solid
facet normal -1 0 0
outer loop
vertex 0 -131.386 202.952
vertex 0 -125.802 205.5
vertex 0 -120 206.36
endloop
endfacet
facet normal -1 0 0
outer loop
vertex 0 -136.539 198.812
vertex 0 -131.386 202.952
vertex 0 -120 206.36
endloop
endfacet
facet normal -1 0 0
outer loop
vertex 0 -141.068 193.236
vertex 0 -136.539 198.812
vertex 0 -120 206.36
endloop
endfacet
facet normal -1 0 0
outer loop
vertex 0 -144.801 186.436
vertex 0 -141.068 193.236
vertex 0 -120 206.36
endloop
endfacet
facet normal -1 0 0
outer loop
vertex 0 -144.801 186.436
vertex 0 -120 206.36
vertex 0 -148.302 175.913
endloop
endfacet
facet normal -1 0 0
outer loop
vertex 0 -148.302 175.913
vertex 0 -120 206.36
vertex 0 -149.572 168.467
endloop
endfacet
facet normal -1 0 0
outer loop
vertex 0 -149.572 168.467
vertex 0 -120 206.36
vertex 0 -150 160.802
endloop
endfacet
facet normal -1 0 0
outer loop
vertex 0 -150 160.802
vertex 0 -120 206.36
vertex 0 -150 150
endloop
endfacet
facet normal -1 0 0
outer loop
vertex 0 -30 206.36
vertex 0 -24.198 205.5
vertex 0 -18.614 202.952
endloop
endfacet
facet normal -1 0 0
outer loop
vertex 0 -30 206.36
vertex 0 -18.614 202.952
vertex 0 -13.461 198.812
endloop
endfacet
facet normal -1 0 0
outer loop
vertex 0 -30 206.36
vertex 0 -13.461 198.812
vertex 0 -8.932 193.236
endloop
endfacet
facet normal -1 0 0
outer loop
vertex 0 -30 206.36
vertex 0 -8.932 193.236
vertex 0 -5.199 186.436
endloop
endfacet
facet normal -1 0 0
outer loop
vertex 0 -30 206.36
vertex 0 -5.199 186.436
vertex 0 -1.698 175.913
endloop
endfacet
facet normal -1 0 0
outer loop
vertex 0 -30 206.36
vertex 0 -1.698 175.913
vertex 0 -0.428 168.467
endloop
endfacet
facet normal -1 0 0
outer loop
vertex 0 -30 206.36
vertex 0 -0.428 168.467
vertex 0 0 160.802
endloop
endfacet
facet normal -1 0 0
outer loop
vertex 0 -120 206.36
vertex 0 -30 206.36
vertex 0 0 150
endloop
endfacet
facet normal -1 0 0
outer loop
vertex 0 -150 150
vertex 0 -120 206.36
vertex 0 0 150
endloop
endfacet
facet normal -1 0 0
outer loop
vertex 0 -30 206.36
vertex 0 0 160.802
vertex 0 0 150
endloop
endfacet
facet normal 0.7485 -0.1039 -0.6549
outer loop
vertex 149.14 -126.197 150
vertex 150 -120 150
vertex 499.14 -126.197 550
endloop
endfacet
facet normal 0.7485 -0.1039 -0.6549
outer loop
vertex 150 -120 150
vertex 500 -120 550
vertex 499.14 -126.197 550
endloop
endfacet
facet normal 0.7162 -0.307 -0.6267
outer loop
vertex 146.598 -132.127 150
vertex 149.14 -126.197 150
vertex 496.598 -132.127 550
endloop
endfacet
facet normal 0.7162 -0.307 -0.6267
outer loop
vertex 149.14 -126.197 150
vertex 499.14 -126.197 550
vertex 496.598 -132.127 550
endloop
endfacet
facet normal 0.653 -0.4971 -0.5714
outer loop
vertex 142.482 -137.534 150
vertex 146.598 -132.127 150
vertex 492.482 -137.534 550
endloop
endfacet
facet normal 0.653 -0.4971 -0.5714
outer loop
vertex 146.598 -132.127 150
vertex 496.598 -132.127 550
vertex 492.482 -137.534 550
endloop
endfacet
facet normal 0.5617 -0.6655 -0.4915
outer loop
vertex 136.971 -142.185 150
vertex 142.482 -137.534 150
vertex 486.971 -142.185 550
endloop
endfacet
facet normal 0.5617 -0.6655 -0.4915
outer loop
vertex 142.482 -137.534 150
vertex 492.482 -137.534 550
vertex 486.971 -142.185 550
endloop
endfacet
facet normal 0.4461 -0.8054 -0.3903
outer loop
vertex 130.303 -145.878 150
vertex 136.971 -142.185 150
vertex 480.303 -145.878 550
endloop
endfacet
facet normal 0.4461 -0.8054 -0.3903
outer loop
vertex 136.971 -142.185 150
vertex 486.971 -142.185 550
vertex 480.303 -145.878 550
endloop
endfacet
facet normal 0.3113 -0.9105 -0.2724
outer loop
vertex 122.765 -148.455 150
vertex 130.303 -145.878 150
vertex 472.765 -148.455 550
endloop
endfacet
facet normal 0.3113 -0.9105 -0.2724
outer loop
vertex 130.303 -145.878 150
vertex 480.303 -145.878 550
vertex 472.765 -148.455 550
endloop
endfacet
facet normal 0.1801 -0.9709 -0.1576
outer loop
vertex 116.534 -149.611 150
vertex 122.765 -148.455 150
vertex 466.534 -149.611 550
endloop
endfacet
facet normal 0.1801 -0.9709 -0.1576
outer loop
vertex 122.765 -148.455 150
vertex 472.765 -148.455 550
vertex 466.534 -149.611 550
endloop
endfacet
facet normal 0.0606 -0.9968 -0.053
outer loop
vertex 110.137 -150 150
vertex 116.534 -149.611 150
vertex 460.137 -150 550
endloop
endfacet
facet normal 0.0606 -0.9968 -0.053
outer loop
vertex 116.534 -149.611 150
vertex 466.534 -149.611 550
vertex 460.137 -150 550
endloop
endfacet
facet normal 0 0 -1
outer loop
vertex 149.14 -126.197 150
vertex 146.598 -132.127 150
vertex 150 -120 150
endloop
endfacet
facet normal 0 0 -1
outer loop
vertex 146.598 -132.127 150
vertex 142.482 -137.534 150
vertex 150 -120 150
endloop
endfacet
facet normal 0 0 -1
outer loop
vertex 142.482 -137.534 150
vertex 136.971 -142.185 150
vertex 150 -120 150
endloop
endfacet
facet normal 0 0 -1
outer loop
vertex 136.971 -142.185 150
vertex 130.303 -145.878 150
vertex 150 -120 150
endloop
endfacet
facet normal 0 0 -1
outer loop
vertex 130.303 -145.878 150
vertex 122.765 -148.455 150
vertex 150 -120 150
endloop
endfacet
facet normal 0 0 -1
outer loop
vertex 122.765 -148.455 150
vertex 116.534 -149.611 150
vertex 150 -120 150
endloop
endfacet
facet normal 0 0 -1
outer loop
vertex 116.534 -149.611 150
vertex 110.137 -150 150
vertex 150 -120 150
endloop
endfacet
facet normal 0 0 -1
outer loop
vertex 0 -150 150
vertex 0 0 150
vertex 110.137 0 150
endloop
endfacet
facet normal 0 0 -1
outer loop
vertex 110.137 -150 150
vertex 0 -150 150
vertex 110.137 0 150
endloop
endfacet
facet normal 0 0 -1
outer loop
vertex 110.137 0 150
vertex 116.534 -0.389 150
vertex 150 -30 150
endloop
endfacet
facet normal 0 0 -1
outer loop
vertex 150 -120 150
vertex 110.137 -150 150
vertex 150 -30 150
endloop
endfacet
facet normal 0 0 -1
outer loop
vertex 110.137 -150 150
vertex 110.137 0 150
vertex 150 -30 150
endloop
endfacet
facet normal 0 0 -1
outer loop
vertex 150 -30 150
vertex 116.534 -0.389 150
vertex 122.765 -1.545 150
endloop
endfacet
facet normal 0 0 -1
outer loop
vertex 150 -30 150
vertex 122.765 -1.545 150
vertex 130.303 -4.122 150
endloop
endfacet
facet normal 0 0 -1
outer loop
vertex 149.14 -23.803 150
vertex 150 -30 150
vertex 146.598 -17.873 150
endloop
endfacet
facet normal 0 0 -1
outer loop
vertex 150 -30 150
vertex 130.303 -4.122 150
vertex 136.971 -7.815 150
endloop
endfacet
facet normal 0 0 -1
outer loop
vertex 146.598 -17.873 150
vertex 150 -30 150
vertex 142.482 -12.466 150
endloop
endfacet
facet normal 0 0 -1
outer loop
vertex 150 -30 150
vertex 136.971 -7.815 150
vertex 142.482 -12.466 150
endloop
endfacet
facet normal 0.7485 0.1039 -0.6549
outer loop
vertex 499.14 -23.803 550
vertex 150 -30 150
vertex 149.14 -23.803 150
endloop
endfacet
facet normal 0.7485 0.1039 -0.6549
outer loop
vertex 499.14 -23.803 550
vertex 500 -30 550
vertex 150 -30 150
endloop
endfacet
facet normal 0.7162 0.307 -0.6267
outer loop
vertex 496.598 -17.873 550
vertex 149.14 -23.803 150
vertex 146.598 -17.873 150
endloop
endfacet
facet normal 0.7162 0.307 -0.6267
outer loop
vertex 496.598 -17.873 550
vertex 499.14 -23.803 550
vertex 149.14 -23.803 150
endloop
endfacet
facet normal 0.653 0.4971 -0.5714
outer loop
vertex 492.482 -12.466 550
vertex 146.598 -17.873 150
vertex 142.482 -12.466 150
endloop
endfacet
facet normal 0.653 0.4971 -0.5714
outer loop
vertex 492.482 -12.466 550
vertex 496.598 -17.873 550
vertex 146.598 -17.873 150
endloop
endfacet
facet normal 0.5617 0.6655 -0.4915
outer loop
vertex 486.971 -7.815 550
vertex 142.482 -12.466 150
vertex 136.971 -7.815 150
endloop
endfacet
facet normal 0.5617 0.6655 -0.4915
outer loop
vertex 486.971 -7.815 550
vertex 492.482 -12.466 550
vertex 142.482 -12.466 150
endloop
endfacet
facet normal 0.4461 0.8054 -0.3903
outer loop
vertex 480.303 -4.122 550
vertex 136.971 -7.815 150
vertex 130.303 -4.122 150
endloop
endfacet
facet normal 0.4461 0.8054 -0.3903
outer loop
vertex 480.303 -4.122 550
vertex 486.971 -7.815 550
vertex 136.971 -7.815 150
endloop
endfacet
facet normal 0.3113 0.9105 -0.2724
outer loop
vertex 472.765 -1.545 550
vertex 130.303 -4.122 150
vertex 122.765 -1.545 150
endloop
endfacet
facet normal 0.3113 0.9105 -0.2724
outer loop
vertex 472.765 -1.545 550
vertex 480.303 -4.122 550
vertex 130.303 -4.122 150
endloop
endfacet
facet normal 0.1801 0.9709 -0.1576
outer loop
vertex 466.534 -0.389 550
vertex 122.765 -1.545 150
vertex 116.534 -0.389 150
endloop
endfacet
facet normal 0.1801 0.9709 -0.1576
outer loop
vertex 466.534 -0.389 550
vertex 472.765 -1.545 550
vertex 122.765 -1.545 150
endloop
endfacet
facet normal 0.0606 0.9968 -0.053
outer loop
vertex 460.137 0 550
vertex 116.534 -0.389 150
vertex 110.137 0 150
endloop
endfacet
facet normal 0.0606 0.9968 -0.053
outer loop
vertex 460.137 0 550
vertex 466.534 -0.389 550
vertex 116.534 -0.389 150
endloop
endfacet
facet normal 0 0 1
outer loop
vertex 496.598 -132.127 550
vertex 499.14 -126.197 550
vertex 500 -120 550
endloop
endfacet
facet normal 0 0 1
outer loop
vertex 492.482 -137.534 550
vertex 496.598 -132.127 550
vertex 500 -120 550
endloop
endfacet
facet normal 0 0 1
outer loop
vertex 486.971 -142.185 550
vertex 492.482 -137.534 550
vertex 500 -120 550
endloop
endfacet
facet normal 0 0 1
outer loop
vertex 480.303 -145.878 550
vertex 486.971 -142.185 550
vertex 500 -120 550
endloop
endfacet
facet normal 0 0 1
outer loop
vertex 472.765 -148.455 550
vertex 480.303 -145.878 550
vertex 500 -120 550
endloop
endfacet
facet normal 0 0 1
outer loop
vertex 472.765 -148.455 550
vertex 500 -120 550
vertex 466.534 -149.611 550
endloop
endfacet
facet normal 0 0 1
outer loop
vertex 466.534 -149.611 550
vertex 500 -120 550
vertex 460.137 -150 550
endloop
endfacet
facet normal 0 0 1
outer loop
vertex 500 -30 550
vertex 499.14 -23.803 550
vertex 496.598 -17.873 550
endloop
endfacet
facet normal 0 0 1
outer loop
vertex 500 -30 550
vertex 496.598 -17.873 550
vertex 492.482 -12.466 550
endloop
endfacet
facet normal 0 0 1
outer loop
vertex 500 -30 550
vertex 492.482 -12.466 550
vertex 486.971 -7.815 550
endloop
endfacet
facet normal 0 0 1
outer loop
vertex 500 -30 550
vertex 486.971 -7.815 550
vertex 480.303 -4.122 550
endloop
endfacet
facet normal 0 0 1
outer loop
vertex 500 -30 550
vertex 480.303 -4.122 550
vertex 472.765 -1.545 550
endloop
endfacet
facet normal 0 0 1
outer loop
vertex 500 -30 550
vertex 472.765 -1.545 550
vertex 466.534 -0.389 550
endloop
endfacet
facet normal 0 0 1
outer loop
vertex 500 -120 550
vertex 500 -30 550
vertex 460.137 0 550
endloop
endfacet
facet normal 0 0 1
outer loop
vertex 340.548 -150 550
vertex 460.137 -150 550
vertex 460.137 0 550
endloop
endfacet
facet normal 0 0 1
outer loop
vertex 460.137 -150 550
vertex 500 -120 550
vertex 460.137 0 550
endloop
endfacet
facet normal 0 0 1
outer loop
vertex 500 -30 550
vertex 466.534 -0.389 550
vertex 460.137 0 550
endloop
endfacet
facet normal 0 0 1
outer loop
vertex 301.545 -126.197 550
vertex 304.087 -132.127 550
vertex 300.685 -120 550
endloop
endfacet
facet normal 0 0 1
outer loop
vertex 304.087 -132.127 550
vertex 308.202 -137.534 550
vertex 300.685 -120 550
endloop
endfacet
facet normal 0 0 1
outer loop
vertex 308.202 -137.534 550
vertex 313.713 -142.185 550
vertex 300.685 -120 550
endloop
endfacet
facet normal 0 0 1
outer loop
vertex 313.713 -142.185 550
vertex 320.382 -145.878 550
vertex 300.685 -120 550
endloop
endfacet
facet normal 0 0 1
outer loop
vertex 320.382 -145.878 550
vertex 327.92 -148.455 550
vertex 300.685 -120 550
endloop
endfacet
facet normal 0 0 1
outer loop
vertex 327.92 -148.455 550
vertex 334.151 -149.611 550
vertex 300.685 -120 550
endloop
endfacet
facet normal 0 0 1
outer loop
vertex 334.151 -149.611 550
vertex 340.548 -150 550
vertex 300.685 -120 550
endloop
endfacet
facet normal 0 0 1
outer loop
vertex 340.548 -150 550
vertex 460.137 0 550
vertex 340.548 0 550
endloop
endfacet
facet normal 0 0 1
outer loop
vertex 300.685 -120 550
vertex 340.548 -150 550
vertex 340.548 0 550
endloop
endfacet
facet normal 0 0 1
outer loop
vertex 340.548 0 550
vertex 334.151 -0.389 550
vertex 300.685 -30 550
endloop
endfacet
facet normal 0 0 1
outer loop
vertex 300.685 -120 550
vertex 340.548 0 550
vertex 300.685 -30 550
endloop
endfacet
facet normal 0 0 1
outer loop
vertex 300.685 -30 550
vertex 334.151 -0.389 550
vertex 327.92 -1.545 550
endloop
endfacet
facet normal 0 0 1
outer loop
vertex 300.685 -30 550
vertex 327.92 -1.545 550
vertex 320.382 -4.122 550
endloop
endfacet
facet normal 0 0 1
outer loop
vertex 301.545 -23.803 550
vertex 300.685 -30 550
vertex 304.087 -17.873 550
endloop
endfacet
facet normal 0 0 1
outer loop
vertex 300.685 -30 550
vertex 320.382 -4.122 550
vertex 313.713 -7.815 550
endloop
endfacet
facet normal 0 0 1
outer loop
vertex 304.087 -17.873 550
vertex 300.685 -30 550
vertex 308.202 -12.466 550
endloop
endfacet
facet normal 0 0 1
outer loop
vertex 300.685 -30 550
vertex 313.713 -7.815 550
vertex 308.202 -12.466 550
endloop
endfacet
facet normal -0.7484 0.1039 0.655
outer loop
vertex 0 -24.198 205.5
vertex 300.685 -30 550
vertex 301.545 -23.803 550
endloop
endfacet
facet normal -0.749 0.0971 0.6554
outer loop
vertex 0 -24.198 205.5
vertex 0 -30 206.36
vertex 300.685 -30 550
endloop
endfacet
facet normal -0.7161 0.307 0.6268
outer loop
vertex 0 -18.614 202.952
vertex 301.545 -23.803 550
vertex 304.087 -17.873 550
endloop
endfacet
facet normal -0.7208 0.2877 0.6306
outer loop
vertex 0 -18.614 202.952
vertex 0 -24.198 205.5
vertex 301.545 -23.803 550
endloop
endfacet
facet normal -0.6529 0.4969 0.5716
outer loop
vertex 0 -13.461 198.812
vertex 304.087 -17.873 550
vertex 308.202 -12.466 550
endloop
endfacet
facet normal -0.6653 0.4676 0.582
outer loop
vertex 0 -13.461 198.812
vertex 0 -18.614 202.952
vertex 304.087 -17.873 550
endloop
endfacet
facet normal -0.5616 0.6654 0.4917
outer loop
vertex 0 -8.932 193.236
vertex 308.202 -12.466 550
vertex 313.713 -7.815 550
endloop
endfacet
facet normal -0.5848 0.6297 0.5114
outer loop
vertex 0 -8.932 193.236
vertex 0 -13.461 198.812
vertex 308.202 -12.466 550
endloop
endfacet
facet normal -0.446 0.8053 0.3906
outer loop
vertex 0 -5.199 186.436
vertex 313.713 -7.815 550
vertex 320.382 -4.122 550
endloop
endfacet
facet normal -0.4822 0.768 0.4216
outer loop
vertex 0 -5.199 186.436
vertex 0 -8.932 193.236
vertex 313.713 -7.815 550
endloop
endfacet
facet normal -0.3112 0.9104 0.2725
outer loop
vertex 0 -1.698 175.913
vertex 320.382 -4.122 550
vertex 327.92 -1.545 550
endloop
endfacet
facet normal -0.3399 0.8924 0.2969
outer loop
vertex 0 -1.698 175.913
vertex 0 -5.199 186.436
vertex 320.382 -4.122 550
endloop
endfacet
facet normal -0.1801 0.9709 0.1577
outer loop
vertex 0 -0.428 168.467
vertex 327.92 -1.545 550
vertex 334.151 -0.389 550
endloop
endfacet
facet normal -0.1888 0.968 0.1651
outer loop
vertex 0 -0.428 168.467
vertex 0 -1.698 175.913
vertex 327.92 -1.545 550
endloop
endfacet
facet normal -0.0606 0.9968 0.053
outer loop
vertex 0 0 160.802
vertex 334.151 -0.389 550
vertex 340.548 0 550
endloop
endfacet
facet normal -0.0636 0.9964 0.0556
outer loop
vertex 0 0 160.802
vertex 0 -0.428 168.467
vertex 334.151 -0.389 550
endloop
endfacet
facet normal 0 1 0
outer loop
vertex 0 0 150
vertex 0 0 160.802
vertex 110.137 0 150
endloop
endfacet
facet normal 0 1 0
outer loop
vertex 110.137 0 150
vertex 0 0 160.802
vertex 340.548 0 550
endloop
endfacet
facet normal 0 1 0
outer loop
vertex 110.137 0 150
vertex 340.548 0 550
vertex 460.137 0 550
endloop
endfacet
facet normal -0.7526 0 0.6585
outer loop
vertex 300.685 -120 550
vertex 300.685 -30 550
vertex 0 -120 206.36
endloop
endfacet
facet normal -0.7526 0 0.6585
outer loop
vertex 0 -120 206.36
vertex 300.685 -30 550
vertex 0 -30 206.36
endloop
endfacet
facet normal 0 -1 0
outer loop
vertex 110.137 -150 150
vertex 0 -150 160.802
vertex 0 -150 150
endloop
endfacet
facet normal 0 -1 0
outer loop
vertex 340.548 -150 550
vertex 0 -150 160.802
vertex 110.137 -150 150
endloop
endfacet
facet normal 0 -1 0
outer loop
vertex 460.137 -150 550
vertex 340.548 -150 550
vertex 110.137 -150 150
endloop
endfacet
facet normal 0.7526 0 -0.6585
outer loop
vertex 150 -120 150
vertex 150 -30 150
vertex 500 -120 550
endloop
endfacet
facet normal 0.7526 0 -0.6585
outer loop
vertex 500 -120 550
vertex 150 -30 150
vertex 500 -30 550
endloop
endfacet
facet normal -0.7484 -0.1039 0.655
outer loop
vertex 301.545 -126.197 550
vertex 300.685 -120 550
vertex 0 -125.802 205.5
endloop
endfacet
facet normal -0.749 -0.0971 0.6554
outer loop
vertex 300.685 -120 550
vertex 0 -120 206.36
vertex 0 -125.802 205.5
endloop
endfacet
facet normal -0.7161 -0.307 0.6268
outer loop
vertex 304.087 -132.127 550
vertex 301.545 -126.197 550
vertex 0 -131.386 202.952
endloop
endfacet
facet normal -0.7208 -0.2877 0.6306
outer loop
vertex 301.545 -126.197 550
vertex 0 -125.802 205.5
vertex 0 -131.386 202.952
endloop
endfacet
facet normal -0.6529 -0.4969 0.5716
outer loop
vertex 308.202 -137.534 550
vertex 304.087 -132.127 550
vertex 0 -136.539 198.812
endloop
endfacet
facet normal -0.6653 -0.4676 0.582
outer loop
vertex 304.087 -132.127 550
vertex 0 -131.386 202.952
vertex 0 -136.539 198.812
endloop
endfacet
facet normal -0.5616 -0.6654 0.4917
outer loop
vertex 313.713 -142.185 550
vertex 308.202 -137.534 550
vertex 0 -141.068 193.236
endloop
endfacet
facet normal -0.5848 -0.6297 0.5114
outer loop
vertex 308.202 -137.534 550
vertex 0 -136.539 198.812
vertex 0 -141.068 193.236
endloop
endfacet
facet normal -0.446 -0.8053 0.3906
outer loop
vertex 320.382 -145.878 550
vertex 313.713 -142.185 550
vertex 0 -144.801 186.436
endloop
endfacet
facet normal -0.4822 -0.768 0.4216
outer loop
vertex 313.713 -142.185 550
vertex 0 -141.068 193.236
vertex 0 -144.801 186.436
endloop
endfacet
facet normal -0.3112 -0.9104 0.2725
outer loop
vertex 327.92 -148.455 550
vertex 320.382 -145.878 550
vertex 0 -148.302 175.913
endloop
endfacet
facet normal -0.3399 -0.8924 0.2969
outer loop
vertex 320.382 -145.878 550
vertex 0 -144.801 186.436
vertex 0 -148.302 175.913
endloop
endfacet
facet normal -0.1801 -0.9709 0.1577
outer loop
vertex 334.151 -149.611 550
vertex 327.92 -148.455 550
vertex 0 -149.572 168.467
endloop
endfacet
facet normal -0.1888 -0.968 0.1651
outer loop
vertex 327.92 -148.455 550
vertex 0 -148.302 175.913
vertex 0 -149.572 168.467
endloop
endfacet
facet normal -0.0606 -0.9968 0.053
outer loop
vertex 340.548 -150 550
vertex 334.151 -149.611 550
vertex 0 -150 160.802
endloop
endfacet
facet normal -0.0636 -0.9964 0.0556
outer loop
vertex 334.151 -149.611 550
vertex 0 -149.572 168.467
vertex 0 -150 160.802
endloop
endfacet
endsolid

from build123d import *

# Parameters (mm, degrees)
F1_DEPTH = 150
F2_R     = 30


with BuildPart() as f1:
    # F0 (on Front) → F1 (new body)
    with BuildSketch(Plane.XZ):
        Polygon((0, 206.360267), (0, 150), (150, 150), (500, 550), (350, 550), (300.684766, 550), align=None)
    extrude(amount=F1_DEPTH)

    # F2
    f2_edges = [f1.edges().sort_by_distance(p)[0] for p in [
        (150.342383, -150, 378.180134),
        (325, -150, 350),
        (325, 0, 350),
        (150.342383, 0, 378.180134),
    ]]
    fillet(f2_edges, radius=F2_R)


solid = f1.part
